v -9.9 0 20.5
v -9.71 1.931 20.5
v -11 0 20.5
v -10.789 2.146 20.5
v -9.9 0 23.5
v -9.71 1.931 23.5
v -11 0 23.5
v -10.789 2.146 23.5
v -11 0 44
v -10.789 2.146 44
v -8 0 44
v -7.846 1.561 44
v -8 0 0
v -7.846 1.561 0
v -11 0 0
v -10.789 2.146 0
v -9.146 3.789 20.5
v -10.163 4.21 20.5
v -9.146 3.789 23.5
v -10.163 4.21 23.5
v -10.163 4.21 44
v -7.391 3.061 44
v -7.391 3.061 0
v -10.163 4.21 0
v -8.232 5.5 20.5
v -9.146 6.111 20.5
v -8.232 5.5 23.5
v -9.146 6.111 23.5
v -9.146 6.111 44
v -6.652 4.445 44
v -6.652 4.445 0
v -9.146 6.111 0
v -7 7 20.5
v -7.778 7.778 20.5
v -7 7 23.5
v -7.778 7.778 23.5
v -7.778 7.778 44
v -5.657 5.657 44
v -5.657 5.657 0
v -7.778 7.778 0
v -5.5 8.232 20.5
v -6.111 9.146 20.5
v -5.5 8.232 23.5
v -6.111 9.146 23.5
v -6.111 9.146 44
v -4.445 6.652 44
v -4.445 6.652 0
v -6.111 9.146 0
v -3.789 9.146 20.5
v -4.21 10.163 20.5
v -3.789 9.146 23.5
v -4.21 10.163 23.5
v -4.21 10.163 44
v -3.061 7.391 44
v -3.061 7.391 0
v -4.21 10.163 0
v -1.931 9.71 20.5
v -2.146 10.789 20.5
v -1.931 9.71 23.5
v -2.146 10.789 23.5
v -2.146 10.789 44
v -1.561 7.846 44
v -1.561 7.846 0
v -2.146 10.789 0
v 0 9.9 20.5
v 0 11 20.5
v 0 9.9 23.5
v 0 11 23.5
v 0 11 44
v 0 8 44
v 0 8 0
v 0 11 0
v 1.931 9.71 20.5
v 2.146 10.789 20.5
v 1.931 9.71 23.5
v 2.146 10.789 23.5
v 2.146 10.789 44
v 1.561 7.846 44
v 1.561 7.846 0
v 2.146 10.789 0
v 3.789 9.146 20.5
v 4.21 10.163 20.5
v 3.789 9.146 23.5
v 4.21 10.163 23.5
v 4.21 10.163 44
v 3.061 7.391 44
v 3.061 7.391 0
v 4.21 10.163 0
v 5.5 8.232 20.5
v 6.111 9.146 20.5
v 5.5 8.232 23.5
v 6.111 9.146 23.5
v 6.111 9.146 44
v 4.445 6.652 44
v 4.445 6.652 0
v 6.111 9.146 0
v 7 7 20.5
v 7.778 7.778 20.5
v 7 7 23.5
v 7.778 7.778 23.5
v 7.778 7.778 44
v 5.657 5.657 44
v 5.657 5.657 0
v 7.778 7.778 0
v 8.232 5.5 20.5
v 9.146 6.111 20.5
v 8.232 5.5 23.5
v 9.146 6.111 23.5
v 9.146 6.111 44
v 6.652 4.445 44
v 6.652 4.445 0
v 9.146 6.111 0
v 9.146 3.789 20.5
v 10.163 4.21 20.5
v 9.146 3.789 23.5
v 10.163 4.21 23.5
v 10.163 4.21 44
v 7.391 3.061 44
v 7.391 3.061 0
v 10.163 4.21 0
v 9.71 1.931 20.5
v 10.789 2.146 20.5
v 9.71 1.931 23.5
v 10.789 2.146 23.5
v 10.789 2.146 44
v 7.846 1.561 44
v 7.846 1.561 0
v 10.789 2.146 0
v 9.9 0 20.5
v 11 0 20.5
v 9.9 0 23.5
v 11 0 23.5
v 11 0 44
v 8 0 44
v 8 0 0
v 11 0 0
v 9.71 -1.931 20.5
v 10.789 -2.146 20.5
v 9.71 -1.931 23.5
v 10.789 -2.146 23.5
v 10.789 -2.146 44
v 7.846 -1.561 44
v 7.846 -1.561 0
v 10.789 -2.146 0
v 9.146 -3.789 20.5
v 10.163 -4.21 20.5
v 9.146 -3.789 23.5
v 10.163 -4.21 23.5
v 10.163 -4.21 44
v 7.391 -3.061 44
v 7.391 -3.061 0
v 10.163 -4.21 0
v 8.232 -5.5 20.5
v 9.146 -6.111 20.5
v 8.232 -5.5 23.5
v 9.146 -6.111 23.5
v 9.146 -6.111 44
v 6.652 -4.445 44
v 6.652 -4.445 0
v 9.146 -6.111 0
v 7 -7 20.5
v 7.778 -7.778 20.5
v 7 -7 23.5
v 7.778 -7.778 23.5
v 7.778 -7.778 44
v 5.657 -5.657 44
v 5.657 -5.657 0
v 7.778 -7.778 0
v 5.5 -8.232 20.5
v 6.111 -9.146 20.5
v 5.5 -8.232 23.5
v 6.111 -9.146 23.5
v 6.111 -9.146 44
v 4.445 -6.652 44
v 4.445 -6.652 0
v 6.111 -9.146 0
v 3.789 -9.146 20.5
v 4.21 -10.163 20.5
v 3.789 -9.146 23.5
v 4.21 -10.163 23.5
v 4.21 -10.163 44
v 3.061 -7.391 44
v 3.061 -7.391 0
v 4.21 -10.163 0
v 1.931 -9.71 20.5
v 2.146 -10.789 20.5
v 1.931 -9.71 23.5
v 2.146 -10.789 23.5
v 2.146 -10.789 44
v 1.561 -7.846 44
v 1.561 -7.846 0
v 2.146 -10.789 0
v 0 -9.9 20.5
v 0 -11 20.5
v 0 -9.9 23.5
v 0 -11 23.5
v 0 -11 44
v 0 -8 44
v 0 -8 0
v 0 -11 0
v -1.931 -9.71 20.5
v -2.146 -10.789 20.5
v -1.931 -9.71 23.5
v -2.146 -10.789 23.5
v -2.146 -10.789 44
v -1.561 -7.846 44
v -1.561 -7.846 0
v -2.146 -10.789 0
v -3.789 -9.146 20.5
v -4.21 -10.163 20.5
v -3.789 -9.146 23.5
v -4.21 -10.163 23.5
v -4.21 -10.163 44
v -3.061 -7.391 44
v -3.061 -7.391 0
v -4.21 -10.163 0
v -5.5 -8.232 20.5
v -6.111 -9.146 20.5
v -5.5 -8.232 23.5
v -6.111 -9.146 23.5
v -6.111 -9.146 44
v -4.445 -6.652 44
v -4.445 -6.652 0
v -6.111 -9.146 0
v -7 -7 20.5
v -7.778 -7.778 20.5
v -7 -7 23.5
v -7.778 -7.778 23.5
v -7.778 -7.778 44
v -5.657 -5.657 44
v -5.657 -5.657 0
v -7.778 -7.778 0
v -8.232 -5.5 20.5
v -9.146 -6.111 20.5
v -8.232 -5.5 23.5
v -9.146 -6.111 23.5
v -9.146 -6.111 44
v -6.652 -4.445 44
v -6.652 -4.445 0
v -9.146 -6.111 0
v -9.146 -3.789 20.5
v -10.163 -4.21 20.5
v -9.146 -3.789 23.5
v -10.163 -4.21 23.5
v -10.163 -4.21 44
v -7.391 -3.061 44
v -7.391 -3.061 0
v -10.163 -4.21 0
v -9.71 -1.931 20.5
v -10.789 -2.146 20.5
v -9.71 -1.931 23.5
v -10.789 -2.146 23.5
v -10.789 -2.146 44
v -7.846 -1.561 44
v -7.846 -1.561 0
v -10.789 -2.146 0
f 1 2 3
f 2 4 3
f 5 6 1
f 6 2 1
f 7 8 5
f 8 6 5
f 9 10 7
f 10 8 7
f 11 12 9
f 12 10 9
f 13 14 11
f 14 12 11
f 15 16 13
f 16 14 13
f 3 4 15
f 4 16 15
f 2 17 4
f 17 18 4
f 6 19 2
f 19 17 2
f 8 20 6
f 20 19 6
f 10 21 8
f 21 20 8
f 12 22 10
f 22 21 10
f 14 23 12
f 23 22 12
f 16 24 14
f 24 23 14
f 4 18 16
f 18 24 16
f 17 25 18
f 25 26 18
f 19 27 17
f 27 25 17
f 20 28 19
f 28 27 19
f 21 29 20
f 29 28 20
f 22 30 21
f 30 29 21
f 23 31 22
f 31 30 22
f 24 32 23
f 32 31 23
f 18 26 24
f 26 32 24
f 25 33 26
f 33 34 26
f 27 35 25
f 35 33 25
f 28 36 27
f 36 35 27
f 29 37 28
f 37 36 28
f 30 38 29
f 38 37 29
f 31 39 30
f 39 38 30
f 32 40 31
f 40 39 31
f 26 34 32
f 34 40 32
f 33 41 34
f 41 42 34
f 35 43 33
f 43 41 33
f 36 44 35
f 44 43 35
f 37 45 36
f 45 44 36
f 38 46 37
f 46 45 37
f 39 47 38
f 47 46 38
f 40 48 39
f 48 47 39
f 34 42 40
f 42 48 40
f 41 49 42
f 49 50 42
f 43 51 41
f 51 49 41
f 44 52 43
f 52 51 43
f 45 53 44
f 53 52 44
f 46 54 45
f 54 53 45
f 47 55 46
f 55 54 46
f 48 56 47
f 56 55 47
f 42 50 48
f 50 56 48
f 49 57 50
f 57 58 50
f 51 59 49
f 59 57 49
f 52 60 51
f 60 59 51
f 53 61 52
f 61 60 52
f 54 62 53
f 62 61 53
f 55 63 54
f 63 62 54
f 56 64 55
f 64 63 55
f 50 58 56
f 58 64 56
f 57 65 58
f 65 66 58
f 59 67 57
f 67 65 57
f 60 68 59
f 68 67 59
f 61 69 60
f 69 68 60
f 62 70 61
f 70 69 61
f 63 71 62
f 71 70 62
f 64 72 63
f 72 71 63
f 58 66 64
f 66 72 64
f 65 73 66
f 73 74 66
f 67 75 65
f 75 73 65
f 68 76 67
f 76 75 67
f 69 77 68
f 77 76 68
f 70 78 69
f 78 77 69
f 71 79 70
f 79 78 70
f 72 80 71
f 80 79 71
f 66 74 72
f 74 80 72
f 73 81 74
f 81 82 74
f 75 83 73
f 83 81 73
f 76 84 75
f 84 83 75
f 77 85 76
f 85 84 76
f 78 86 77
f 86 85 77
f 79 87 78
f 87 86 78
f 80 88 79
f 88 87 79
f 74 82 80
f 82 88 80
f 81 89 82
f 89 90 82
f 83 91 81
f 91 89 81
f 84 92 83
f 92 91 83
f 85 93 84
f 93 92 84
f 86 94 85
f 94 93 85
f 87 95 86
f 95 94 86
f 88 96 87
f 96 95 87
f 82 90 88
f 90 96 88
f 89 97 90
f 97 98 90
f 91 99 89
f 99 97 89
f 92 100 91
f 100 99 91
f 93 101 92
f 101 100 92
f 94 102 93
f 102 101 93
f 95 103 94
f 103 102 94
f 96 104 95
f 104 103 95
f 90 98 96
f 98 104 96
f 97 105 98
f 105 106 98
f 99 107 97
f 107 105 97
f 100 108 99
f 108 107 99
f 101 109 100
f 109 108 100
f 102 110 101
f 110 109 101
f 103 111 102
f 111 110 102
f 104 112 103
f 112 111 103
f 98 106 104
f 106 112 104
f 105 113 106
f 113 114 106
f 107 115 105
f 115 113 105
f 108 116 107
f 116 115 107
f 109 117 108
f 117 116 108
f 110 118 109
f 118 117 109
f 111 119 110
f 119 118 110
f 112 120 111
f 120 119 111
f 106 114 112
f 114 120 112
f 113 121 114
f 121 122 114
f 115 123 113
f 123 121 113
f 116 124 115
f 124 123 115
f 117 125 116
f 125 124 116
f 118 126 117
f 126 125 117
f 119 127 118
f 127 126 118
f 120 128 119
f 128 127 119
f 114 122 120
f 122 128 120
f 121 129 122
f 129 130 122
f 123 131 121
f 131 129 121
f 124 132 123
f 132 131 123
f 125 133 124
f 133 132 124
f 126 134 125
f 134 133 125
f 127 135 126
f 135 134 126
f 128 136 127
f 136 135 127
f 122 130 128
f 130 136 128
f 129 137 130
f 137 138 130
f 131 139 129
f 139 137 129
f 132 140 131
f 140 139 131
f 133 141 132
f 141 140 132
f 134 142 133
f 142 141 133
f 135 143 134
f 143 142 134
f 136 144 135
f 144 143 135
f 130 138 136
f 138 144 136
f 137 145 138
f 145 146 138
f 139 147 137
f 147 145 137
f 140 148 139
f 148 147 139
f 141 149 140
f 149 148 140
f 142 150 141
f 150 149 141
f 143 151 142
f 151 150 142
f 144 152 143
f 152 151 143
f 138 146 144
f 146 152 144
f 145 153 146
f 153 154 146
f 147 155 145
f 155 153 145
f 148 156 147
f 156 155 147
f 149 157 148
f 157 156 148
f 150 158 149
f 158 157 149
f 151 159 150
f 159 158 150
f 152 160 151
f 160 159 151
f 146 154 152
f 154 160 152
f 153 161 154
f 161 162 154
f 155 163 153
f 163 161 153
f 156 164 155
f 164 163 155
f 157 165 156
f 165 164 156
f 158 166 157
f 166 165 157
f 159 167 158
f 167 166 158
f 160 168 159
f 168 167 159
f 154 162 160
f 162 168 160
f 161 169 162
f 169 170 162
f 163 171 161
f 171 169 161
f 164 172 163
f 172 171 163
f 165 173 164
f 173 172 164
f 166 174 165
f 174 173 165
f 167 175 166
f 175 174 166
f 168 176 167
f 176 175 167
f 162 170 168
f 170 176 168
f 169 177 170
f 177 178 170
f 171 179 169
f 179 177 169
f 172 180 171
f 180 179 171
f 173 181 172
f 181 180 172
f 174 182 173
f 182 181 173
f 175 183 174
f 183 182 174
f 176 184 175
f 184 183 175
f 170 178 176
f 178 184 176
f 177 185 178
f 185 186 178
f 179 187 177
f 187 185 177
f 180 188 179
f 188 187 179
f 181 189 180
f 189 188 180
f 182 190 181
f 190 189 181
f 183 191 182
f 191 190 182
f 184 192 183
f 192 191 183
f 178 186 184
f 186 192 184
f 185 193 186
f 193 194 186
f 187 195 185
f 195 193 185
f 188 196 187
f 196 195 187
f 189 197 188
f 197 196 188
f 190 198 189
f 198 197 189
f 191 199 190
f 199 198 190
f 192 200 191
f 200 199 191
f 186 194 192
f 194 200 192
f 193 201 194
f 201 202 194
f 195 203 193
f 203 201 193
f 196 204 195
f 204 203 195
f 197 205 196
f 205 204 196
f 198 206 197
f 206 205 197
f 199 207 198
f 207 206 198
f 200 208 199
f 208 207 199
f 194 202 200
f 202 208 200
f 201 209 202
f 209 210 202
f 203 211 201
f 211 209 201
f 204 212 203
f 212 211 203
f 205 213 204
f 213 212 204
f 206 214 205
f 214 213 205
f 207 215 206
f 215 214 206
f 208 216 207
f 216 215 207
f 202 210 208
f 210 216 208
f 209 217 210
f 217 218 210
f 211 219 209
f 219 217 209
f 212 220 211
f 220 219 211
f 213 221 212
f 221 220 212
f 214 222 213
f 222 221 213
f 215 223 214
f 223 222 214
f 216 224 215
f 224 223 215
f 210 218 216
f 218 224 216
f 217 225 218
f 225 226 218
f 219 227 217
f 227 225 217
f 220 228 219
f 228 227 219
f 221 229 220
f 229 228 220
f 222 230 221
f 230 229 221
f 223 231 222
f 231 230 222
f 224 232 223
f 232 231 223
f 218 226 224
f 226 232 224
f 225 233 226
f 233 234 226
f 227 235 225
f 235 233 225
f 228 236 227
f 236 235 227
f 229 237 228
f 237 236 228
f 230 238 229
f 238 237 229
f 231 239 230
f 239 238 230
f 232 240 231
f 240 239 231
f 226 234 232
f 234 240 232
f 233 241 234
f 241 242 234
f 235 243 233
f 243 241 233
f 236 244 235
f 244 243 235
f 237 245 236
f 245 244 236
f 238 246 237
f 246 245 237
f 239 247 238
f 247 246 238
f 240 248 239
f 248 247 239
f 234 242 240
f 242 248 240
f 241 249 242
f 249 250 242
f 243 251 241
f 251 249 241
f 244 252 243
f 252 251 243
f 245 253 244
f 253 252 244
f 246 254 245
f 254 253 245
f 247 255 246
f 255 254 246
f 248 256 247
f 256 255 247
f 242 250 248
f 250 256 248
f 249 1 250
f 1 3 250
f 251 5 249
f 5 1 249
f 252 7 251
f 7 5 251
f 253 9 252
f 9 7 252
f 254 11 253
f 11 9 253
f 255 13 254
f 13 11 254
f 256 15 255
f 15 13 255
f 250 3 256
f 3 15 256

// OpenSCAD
$fn = 32;

// ----------------------------------------------------------------------
// Grooved revolve: stepped, bore R8
// ----------------------------------------------------------------------

// --- parameters (mm) ---
bore_r = 8;               // bore radius
outer_r = 11;             // outer radius of the body
total_h = 44;             // overall height, Z
wall = 3;                 // radial wall thickness
groove_w = 3;             // groove width
groove_d = 1.1;           // groove depth
grooves = 1;              // number of outer grooves

bbox_x = 2 * outer_r;  // full diameter
bore_d = 2 * bore_r;  // bore diameter
body_d = 2 * outer_r;  // body diameter
revolve_angle = 360;  // full turn around the Z axis

profile = [[8, 0], [11, 0], [11, 20.5], [9.9, 20.5], [9.9, 23.5], [11, 23.5], [11, 44], [8, 44]];  // primary outline, 8 points, counter clockwise

// --- the one profile operation ---
rotate_extrude(angle = revolve_angle) polygon(points = profile);
